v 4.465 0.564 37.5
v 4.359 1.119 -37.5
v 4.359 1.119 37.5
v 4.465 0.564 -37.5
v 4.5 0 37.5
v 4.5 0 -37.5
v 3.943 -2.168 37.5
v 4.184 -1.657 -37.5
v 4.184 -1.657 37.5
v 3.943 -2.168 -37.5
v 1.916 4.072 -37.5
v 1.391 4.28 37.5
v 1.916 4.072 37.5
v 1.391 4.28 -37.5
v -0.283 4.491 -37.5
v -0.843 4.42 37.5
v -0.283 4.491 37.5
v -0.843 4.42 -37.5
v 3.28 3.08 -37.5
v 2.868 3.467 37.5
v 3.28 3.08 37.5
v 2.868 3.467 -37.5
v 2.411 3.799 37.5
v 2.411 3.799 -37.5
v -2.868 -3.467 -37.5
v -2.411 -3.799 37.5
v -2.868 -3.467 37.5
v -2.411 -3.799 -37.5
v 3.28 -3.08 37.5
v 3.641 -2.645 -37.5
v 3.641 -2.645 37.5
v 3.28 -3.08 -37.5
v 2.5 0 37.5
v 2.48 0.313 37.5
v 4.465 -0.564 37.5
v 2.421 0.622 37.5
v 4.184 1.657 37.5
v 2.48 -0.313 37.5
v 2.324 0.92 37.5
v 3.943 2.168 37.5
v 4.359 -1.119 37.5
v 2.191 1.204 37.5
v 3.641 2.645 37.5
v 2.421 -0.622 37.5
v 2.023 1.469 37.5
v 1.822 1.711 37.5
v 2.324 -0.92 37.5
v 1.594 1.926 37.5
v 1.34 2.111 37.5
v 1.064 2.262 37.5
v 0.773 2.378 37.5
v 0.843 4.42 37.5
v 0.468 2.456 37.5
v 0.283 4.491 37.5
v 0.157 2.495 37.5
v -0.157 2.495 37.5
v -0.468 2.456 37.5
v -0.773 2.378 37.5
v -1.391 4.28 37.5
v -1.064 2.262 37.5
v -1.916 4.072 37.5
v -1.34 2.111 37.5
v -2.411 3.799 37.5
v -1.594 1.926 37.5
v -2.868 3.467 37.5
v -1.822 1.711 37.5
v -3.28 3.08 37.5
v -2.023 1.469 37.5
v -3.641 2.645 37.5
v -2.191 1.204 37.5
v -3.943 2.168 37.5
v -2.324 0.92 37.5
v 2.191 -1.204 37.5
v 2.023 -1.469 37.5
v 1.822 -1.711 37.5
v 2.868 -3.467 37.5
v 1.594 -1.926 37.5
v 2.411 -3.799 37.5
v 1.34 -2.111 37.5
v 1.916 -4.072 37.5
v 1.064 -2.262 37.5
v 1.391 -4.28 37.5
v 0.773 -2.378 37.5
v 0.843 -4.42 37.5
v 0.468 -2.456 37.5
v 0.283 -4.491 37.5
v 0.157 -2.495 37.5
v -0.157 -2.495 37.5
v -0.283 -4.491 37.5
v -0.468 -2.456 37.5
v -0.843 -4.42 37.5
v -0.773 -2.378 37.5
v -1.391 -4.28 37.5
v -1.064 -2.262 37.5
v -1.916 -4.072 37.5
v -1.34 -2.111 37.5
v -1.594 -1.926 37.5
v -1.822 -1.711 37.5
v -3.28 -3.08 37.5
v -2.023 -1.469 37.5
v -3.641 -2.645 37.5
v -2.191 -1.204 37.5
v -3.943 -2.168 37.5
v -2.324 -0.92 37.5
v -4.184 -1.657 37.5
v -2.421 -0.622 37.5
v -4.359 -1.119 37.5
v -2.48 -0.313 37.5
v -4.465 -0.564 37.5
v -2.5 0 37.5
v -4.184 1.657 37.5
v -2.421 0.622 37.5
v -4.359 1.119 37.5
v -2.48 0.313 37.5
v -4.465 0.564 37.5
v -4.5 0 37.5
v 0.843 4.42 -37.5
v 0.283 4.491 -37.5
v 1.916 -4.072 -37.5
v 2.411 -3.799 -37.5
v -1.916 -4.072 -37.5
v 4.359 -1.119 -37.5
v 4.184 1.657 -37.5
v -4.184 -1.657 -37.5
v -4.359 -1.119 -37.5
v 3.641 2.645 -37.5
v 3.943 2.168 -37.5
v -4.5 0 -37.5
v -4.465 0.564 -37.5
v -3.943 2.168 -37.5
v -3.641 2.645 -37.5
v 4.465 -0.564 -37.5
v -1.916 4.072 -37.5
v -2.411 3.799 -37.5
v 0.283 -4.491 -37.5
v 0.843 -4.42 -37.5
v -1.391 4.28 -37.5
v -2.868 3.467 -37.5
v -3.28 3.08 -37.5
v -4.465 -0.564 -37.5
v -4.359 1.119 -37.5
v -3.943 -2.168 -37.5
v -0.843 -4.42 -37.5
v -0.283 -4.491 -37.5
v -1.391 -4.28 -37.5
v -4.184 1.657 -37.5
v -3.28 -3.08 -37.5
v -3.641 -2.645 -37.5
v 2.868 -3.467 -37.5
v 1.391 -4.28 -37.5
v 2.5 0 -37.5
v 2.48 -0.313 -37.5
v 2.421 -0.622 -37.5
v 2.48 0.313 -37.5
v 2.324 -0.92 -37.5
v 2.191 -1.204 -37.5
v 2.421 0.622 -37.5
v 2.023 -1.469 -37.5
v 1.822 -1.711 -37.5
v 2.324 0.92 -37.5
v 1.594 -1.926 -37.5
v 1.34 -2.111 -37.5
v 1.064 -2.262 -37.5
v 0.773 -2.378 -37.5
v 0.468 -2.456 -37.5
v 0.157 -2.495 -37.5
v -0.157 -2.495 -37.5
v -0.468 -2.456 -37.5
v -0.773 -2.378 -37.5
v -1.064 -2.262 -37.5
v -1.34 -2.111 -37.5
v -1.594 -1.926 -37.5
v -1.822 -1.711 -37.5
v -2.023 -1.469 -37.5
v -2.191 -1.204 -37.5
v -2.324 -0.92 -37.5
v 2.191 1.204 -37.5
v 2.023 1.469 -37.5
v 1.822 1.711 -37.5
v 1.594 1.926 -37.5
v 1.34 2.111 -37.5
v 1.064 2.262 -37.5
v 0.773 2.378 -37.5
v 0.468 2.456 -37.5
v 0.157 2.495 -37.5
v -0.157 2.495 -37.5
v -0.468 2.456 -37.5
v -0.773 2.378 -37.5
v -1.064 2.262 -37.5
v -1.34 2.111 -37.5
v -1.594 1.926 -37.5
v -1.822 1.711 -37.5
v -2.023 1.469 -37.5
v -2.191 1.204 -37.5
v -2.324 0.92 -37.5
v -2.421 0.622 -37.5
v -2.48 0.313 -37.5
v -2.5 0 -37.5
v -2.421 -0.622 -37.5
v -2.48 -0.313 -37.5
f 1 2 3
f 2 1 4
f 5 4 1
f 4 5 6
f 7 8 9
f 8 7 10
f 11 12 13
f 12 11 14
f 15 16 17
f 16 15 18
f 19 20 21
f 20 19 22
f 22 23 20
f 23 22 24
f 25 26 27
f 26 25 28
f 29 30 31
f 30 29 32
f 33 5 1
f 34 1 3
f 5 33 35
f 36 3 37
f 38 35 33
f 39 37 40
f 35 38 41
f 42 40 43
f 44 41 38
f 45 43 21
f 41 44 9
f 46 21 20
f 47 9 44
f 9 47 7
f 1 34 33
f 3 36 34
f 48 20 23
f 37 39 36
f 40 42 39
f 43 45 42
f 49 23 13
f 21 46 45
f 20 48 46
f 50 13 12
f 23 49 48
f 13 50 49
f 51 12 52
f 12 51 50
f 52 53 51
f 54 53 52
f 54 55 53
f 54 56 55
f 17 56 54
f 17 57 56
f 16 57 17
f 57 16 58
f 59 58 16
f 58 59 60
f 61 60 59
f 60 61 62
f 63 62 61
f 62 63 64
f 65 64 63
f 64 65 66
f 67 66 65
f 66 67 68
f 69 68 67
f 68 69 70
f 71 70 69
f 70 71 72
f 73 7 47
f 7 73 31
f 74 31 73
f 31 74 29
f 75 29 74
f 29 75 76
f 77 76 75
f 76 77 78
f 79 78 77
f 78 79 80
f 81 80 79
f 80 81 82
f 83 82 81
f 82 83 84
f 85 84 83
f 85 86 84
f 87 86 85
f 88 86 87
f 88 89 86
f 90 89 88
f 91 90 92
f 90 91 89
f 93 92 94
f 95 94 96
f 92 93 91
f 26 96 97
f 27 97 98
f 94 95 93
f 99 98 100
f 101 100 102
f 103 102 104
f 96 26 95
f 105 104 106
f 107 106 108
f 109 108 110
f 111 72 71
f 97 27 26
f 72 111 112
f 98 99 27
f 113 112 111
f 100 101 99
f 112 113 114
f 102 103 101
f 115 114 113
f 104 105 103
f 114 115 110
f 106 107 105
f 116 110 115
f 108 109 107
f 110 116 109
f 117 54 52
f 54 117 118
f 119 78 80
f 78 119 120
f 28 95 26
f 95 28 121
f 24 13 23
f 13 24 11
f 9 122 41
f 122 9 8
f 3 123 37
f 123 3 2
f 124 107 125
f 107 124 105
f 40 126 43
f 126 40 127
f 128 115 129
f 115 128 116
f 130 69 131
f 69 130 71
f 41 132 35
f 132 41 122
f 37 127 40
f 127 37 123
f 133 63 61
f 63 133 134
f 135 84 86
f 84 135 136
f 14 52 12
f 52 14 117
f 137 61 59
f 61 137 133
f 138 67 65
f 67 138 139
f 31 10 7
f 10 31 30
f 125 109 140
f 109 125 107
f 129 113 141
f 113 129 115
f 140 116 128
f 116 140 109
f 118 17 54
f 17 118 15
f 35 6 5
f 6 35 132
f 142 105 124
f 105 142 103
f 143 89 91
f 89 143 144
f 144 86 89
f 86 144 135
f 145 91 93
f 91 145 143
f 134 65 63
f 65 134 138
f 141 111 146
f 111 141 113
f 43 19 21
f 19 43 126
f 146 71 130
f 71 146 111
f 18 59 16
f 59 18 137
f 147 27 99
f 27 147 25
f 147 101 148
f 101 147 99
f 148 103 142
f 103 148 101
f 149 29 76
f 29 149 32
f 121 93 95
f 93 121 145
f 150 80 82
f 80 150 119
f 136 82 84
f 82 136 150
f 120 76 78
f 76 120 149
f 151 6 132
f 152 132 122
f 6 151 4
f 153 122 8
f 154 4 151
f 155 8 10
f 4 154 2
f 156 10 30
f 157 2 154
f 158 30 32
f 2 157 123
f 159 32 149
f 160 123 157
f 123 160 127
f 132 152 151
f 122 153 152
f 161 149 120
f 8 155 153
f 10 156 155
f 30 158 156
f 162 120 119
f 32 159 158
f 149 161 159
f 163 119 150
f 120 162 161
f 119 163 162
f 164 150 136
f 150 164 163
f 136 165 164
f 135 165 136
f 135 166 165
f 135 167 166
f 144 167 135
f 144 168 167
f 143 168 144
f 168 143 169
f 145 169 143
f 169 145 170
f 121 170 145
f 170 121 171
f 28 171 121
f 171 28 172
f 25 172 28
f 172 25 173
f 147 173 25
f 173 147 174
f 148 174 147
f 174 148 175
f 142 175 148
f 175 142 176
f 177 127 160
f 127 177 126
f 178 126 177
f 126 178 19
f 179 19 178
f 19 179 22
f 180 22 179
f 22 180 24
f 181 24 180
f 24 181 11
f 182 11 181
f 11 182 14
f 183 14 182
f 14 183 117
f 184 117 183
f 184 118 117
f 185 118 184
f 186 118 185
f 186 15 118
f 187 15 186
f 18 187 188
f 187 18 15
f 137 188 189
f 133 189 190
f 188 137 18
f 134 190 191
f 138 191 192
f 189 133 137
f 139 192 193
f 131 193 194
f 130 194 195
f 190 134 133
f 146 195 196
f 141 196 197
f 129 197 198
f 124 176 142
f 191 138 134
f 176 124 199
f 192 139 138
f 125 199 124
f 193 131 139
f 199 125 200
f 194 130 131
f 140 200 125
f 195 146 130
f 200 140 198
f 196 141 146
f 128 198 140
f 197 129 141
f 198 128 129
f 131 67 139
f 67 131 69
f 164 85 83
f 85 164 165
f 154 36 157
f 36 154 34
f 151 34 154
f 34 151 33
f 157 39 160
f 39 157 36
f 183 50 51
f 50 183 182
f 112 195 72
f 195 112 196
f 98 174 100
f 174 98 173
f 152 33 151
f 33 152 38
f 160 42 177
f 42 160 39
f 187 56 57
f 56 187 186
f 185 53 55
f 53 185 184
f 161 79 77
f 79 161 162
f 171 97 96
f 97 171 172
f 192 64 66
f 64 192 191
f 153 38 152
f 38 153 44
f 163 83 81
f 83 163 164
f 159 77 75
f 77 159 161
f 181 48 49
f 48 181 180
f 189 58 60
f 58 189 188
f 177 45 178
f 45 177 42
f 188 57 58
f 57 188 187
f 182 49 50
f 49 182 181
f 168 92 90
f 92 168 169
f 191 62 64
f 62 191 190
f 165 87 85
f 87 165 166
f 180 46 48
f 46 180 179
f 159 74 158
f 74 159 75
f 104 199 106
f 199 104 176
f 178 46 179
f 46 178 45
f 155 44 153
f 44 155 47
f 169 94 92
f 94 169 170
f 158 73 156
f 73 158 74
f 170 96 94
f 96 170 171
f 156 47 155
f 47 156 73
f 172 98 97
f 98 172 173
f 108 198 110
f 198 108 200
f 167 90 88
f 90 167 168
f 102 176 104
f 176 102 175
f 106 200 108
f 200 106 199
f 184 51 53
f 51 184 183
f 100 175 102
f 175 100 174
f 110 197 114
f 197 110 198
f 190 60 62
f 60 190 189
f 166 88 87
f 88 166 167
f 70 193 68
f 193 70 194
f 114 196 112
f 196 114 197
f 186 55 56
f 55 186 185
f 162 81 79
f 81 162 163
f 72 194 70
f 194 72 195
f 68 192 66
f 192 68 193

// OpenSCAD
$fn = 50;


difference() {
	union() {
		translate(v = [0, 0, -37.5000000000]) {
			cylinder(h = 75, r = 4.5000000000);
		}
	}
	union() {
		translate(v = [0, 0, -100.0000000000]) {
			cylinder(h = 200, r = 2.5000000000);
		}
	}
}
